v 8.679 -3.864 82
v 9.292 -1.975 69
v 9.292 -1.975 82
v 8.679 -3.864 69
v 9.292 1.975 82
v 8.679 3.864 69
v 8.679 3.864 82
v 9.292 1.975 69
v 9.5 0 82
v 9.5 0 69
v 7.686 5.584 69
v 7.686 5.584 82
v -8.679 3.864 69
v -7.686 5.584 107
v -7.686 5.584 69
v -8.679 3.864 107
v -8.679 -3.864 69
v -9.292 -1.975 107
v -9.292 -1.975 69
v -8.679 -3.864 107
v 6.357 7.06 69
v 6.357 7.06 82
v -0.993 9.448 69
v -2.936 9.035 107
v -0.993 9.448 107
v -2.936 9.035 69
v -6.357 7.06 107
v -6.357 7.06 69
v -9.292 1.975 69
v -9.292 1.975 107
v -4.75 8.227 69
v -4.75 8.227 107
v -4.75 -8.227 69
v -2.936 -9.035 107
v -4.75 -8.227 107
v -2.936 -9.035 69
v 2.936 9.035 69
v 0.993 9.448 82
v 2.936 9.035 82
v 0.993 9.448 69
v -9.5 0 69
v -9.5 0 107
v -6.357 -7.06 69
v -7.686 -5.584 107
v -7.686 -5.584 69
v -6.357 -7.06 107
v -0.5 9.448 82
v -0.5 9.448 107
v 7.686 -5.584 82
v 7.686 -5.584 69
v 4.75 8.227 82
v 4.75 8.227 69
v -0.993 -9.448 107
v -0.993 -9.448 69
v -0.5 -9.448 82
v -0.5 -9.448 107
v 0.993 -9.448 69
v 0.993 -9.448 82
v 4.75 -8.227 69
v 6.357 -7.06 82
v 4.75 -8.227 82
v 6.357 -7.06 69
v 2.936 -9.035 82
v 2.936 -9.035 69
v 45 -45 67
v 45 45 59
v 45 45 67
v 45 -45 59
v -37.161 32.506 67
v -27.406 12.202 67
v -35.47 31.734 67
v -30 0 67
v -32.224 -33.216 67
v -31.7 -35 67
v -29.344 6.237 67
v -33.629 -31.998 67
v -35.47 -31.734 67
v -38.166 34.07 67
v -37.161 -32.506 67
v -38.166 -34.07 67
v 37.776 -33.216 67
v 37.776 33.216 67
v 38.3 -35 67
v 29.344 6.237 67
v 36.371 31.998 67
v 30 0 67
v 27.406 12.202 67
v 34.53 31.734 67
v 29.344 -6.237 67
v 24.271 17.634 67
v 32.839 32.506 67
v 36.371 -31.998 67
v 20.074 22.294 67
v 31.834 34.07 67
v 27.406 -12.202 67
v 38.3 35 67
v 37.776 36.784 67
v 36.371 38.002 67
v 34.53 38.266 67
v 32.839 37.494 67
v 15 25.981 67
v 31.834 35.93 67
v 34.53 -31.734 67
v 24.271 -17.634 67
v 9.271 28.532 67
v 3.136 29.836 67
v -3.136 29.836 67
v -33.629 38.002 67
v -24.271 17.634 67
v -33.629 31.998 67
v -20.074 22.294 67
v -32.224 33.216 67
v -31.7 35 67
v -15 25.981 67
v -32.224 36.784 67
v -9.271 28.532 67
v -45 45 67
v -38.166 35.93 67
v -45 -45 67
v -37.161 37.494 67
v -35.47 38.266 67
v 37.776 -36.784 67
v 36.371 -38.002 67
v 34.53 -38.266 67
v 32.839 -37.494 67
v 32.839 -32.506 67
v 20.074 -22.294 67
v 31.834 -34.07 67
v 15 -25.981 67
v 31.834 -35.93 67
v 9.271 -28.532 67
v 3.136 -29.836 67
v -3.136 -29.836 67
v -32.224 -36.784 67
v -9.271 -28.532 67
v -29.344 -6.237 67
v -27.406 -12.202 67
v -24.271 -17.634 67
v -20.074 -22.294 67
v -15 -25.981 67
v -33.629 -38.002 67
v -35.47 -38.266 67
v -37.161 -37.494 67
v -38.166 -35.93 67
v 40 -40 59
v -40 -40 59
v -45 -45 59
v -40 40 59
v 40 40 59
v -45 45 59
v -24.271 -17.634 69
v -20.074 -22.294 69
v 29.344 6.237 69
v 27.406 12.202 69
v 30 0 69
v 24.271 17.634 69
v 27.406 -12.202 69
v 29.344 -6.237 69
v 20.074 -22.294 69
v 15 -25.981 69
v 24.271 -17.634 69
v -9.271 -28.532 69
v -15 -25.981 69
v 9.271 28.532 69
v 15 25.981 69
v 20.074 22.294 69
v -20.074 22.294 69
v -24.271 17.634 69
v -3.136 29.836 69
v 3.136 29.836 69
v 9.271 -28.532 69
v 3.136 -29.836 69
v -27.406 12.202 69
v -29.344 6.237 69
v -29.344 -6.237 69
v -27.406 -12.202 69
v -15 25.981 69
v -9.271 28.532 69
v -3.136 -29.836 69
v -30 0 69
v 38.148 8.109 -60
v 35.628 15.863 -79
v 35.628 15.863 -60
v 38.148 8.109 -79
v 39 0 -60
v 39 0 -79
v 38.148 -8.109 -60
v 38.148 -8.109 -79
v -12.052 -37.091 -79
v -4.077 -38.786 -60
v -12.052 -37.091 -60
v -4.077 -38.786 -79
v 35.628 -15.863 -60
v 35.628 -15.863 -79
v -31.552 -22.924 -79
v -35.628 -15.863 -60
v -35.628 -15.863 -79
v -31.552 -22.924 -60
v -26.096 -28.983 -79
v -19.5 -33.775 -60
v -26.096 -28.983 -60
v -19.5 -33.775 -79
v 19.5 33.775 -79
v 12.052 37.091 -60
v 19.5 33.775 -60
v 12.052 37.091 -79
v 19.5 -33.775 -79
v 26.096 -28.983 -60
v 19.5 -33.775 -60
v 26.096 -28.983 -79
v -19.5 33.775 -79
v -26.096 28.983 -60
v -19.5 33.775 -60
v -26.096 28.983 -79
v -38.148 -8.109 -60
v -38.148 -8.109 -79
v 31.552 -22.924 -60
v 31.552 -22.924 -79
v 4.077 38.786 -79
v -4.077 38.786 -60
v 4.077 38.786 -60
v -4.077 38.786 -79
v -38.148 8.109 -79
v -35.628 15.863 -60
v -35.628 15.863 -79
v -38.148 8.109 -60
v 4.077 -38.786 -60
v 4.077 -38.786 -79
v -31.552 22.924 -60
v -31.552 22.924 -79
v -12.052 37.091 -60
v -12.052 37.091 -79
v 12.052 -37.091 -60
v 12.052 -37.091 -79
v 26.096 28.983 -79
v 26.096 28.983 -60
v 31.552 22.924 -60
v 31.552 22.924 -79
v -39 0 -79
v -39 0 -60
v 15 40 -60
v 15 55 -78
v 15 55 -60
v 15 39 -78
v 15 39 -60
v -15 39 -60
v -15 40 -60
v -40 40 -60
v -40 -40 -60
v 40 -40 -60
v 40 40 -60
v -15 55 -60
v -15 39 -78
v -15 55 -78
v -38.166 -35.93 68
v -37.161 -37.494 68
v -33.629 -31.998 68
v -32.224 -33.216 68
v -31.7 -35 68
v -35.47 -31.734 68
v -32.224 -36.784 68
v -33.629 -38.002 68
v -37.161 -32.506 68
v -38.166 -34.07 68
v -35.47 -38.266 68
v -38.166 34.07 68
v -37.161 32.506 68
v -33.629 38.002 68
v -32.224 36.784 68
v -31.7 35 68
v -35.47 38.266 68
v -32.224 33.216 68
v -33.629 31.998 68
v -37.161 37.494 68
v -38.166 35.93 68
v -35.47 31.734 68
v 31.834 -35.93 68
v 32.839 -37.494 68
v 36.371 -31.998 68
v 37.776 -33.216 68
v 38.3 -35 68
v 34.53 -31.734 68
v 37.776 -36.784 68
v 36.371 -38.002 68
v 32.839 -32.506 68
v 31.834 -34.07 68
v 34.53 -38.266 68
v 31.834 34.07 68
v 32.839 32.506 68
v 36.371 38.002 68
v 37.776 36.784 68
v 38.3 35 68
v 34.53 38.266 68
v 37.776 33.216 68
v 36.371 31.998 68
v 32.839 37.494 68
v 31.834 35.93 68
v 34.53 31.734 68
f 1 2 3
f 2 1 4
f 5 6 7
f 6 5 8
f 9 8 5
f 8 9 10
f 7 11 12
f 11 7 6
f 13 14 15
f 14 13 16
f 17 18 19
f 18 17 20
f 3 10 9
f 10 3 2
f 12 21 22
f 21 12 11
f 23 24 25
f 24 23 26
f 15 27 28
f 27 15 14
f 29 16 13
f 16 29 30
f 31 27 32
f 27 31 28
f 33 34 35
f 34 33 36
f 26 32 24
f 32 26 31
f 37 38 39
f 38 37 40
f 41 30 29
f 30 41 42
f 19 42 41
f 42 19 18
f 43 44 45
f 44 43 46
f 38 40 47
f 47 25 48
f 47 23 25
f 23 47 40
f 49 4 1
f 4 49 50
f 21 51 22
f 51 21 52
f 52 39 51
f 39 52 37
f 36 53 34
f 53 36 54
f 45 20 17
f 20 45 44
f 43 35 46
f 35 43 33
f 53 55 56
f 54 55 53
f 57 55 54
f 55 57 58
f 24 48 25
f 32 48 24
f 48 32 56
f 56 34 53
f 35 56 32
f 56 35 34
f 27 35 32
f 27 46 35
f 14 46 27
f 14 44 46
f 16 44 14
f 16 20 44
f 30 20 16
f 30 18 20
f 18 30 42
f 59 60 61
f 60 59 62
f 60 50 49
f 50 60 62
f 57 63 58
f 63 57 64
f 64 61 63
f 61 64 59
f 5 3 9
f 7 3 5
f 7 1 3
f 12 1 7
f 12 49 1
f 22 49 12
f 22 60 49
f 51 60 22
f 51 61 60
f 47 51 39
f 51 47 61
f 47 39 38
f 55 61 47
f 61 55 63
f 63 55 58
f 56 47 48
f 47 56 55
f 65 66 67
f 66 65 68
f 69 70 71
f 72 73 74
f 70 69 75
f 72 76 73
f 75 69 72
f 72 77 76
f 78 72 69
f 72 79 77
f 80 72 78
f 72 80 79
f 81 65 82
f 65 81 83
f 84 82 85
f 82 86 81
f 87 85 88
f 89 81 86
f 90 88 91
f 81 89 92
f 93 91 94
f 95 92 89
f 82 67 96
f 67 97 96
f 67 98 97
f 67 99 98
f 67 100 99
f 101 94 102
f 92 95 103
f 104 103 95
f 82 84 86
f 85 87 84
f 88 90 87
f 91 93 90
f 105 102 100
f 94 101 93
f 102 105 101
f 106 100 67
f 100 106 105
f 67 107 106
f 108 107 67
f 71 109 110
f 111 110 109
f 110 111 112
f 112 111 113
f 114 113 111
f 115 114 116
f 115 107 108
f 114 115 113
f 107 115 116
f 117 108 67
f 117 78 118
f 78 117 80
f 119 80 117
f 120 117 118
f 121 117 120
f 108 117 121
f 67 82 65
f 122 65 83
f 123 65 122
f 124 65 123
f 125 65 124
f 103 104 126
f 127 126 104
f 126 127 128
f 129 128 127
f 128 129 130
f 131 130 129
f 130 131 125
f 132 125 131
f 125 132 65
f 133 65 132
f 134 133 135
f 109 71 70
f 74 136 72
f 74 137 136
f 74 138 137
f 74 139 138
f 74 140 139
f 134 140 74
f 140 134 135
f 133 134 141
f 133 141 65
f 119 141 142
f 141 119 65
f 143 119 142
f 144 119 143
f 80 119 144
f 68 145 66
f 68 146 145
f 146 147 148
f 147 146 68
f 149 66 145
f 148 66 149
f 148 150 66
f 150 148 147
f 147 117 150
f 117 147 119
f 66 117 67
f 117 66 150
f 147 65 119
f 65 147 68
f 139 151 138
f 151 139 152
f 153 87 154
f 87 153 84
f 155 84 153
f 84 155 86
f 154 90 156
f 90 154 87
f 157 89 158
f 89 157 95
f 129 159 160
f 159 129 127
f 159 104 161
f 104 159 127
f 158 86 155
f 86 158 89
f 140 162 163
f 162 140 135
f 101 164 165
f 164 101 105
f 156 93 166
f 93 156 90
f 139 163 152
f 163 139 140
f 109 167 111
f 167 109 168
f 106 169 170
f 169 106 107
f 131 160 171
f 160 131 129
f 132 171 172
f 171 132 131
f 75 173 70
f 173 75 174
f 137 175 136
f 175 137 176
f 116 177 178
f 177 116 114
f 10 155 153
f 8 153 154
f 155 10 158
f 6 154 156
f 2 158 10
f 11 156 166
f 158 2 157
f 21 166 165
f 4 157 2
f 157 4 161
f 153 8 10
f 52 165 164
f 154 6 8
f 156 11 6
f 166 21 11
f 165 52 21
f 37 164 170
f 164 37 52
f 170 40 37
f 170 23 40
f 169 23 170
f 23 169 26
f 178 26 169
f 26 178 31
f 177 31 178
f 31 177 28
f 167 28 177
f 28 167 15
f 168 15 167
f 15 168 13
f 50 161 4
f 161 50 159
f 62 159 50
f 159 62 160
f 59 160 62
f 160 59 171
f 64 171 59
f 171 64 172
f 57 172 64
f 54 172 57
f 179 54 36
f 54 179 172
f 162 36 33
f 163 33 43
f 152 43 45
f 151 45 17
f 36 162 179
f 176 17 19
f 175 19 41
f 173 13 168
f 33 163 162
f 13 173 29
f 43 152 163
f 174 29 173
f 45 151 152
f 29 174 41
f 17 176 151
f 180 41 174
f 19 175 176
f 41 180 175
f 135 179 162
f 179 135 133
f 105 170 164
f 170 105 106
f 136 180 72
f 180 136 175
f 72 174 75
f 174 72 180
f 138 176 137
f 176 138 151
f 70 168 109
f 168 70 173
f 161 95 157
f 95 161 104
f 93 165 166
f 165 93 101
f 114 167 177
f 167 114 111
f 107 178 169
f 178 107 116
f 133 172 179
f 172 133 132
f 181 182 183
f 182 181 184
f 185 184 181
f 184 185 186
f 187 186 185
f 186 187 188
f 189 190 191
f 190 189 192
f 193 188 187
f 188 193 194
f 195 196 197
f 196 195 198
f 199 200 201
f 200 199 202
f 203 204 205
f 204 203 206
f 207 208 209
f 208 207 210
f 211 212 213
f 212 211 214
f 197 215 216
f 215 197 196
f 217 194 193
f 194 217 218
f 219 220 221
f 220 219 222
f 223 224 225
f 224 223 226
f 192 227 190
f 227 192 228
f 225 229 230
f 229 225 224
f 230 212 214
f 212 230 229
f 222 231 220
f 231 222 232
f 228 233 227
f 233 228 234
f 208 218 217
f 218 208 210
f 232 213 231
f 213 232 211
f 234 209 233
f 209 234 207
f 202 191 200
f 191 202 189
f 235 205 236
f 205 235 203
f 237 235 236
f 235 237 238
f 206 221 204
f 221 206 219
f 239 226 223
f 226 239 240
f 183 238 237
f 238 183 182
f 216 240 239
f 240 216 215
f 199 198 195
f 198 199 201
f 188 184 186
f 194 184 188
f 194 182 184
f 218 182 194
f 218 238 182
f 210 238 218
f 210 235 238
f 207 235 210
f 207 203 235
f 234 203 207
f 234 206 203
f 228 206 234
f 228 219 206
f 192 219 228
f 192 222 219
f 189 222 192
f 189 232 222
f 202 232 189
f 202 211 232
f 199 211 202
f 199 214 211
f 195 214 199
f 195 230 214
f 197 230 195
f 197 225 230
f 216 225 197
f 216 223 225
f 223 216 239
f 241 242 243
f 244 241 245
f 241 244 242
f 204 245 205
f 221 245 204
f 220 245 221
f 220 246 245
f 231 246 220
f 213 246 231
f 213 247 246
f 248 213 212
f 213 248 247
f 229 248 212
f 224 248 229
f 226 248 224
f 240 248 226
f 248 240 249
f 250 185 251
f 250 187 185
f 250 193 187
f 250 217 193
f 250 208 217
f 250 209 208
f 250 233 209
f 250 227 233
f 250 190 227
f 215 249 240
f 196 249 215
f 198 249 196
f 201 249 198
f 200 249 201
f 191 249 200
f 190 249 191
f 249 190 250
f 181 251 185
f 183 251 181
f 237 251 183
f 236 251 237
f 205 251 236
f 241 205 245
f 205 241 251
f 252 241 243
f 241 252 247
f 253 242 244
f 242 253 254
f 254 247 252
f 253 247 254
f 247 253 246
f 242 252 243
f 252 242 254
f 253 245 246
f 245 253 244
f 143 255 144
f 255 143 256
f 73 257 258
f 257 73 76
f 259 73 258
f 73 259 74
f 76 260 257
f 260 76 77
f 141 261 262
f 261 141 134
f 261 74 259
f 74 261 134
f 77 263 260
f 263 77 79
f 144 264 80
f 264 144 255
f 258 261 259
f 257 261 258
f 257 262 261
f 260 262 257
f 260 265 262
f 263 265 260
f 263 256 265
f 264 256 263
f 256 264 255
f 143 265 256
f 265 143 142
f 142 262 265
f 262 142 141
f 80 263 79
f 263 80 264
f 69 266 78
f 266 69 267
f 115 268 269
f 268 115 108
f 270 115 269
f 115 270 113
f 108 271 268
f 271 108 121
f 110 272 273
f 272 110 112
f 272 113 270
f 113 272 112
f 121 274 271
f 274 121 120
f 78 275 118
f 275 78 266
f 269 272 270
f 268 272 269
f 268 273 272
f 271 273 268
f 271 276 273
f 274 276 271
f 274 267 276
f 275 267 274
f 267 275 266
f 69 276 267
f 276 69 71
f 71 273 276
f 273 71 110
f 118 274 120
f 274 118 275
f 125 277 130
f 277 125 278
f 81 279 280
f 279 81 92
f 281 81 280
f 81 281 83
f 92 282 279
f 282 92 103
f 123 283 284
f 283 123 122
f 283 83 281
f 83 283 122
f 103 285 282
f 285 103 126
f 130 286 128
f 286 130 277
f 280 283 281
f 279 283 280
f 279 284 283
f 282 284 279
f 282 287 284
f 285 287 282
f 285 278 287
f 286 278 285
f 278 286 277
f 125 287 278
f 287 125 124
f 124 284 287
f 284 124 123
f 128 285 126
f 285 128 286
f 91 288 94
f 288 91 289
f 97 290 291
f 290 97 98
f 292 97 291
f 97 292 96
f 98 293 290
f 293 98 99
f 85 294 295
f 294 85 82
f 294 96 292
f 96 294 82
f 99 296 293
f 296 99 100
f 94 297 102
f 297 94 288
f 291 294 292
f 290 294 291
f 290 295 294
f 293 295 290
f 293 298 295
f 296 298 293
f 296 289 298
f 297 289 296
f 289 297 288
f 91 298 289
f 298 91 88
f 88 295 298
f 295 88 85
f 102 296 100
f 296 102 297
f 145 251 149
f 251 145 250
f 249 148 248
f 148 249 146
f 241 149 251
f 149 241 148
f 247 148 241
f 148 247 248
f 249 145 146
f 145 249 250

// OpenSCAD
// Parameters
motor_frame_size_mm = 80; //[40:160:1]
body_length_mm = 120; //[60:240:1]
corner_radius_mm = 2; //[1:6:1]
faceplate_thickness_mm = 8; //[4:16:1]
faceplate_size_mm = 90; //[70:140:1]
pilot_diameter_mm = 60; //[40:100:1]
pilot_length_mm = 2; //[1:6:1]
mount_hole_pitch_mm = 70; //[50:110:1]
mount_hole_diameter_mm = 6.6; //[4:10:0.1]
shaft_diameter_mm = 19; //[10:30:0.1]
shaft_length_mm = 40; //[15:80:1]
shaft_flat_depth_mm = 1; //[0.5:3:0.1]
shaft_flat_length_mm = 25; //[10:60:1]
rear_cap_length_mm = 20; //[10:50:1]
rear_cap_diameter_mm = 78; //[50:140:1]
connector_width_mm = 30; //[15:60:1]
connector_height_mm = 18; //[10:40:1]
connector_length_mm = 16; //[8:40:1]
tolerances_mm = 0.2; //[0.1:0.6:0.05]
overlap_mm = 1; //[0.5:2:0.1]

// Servo Motor - complete geometry
module servo_motor() {
  // Motor Housing
  color([0.15, 0.2, 0.35]) {
    cube([motor_frame_size_mm, motor_frame_size_mm, body_length_mm], center=true);
  }
  
  // Front Faceplate
  translate([0, 0, body_length_mm/2 + faceplate_thickness_mm/2 - overlap_mm]) {
    color([0.15, 0.2, 0.35]) {
      cube([faceplate_size_mm, faceplate_size_mm, faceplate_thickness_mm], center=true);
    }
    // Front Pilot
    color("Silver") {
      translate([0, 0, faceplate_thickness_mm/2 + pilot_length_mm/2]) {
        cylinder(r=pilot_diameter_mm/2, h=pilot_length_mm, center=true);
      }
    }
    // Output Shaft
    color("Silver") {
      translate([0, 0, faceplate_thickness_mm/2 + shaft_length_mm/2]) {
        difference() {
          cylinder(r=shaft_diameter_mm/2, h=shaft_length_mm, center=true);
          translate([shaft_diameter_mm/2 - shaft_flat_depth_mm/2, 0, shaft_length_mm/2 - shaft_flat_length_mm/2]) {
            cube([shaft_diameter_mm, shaft_diameter_mm, shaft_flat_length_mm], center=true);
          }
        }
      }
    }
  }
  
  // Rear Cap
  translate([0, 0, -body_length_mm/2 - rear_cap_length_mm/2 + overlap_mm]) {
    color([0.15, 0.2, 0.35]) {
      cylinder(r=rear_cap_diameter_mm/2, h=rear_cap_length_mm, center=true);
    }
    // Cable Connector Boss
    translate([0, motor_frame_size_mm/2 + connector_length_mm/2 - overlap_mm, 0]) {
      color([0.15, 0.2, 0.35]) {
        cube([connector_width_mm, connector_length_mm, connector_height_mm], center=true);
      }
    }
  }
  
  // Mounting Holes
  color("Black") {
    for (x = [-1, 1], y = [-1, 1]) {
      translate([x * mount_hole_pitch_mm/2, y * mount_hole_pitch_mm/2, body_length_mm/2 + faceplate_thickness_mm/2 - overlap_mm]) {
        cylinder(r=mount_hole_diameter_mm/2, h=faceplate_thickness_mm + 2*overlap_mm, center=true);
      }
    }
  }
}

// Assembly
module assembly() {
  servo_motor();
}

assembly();
